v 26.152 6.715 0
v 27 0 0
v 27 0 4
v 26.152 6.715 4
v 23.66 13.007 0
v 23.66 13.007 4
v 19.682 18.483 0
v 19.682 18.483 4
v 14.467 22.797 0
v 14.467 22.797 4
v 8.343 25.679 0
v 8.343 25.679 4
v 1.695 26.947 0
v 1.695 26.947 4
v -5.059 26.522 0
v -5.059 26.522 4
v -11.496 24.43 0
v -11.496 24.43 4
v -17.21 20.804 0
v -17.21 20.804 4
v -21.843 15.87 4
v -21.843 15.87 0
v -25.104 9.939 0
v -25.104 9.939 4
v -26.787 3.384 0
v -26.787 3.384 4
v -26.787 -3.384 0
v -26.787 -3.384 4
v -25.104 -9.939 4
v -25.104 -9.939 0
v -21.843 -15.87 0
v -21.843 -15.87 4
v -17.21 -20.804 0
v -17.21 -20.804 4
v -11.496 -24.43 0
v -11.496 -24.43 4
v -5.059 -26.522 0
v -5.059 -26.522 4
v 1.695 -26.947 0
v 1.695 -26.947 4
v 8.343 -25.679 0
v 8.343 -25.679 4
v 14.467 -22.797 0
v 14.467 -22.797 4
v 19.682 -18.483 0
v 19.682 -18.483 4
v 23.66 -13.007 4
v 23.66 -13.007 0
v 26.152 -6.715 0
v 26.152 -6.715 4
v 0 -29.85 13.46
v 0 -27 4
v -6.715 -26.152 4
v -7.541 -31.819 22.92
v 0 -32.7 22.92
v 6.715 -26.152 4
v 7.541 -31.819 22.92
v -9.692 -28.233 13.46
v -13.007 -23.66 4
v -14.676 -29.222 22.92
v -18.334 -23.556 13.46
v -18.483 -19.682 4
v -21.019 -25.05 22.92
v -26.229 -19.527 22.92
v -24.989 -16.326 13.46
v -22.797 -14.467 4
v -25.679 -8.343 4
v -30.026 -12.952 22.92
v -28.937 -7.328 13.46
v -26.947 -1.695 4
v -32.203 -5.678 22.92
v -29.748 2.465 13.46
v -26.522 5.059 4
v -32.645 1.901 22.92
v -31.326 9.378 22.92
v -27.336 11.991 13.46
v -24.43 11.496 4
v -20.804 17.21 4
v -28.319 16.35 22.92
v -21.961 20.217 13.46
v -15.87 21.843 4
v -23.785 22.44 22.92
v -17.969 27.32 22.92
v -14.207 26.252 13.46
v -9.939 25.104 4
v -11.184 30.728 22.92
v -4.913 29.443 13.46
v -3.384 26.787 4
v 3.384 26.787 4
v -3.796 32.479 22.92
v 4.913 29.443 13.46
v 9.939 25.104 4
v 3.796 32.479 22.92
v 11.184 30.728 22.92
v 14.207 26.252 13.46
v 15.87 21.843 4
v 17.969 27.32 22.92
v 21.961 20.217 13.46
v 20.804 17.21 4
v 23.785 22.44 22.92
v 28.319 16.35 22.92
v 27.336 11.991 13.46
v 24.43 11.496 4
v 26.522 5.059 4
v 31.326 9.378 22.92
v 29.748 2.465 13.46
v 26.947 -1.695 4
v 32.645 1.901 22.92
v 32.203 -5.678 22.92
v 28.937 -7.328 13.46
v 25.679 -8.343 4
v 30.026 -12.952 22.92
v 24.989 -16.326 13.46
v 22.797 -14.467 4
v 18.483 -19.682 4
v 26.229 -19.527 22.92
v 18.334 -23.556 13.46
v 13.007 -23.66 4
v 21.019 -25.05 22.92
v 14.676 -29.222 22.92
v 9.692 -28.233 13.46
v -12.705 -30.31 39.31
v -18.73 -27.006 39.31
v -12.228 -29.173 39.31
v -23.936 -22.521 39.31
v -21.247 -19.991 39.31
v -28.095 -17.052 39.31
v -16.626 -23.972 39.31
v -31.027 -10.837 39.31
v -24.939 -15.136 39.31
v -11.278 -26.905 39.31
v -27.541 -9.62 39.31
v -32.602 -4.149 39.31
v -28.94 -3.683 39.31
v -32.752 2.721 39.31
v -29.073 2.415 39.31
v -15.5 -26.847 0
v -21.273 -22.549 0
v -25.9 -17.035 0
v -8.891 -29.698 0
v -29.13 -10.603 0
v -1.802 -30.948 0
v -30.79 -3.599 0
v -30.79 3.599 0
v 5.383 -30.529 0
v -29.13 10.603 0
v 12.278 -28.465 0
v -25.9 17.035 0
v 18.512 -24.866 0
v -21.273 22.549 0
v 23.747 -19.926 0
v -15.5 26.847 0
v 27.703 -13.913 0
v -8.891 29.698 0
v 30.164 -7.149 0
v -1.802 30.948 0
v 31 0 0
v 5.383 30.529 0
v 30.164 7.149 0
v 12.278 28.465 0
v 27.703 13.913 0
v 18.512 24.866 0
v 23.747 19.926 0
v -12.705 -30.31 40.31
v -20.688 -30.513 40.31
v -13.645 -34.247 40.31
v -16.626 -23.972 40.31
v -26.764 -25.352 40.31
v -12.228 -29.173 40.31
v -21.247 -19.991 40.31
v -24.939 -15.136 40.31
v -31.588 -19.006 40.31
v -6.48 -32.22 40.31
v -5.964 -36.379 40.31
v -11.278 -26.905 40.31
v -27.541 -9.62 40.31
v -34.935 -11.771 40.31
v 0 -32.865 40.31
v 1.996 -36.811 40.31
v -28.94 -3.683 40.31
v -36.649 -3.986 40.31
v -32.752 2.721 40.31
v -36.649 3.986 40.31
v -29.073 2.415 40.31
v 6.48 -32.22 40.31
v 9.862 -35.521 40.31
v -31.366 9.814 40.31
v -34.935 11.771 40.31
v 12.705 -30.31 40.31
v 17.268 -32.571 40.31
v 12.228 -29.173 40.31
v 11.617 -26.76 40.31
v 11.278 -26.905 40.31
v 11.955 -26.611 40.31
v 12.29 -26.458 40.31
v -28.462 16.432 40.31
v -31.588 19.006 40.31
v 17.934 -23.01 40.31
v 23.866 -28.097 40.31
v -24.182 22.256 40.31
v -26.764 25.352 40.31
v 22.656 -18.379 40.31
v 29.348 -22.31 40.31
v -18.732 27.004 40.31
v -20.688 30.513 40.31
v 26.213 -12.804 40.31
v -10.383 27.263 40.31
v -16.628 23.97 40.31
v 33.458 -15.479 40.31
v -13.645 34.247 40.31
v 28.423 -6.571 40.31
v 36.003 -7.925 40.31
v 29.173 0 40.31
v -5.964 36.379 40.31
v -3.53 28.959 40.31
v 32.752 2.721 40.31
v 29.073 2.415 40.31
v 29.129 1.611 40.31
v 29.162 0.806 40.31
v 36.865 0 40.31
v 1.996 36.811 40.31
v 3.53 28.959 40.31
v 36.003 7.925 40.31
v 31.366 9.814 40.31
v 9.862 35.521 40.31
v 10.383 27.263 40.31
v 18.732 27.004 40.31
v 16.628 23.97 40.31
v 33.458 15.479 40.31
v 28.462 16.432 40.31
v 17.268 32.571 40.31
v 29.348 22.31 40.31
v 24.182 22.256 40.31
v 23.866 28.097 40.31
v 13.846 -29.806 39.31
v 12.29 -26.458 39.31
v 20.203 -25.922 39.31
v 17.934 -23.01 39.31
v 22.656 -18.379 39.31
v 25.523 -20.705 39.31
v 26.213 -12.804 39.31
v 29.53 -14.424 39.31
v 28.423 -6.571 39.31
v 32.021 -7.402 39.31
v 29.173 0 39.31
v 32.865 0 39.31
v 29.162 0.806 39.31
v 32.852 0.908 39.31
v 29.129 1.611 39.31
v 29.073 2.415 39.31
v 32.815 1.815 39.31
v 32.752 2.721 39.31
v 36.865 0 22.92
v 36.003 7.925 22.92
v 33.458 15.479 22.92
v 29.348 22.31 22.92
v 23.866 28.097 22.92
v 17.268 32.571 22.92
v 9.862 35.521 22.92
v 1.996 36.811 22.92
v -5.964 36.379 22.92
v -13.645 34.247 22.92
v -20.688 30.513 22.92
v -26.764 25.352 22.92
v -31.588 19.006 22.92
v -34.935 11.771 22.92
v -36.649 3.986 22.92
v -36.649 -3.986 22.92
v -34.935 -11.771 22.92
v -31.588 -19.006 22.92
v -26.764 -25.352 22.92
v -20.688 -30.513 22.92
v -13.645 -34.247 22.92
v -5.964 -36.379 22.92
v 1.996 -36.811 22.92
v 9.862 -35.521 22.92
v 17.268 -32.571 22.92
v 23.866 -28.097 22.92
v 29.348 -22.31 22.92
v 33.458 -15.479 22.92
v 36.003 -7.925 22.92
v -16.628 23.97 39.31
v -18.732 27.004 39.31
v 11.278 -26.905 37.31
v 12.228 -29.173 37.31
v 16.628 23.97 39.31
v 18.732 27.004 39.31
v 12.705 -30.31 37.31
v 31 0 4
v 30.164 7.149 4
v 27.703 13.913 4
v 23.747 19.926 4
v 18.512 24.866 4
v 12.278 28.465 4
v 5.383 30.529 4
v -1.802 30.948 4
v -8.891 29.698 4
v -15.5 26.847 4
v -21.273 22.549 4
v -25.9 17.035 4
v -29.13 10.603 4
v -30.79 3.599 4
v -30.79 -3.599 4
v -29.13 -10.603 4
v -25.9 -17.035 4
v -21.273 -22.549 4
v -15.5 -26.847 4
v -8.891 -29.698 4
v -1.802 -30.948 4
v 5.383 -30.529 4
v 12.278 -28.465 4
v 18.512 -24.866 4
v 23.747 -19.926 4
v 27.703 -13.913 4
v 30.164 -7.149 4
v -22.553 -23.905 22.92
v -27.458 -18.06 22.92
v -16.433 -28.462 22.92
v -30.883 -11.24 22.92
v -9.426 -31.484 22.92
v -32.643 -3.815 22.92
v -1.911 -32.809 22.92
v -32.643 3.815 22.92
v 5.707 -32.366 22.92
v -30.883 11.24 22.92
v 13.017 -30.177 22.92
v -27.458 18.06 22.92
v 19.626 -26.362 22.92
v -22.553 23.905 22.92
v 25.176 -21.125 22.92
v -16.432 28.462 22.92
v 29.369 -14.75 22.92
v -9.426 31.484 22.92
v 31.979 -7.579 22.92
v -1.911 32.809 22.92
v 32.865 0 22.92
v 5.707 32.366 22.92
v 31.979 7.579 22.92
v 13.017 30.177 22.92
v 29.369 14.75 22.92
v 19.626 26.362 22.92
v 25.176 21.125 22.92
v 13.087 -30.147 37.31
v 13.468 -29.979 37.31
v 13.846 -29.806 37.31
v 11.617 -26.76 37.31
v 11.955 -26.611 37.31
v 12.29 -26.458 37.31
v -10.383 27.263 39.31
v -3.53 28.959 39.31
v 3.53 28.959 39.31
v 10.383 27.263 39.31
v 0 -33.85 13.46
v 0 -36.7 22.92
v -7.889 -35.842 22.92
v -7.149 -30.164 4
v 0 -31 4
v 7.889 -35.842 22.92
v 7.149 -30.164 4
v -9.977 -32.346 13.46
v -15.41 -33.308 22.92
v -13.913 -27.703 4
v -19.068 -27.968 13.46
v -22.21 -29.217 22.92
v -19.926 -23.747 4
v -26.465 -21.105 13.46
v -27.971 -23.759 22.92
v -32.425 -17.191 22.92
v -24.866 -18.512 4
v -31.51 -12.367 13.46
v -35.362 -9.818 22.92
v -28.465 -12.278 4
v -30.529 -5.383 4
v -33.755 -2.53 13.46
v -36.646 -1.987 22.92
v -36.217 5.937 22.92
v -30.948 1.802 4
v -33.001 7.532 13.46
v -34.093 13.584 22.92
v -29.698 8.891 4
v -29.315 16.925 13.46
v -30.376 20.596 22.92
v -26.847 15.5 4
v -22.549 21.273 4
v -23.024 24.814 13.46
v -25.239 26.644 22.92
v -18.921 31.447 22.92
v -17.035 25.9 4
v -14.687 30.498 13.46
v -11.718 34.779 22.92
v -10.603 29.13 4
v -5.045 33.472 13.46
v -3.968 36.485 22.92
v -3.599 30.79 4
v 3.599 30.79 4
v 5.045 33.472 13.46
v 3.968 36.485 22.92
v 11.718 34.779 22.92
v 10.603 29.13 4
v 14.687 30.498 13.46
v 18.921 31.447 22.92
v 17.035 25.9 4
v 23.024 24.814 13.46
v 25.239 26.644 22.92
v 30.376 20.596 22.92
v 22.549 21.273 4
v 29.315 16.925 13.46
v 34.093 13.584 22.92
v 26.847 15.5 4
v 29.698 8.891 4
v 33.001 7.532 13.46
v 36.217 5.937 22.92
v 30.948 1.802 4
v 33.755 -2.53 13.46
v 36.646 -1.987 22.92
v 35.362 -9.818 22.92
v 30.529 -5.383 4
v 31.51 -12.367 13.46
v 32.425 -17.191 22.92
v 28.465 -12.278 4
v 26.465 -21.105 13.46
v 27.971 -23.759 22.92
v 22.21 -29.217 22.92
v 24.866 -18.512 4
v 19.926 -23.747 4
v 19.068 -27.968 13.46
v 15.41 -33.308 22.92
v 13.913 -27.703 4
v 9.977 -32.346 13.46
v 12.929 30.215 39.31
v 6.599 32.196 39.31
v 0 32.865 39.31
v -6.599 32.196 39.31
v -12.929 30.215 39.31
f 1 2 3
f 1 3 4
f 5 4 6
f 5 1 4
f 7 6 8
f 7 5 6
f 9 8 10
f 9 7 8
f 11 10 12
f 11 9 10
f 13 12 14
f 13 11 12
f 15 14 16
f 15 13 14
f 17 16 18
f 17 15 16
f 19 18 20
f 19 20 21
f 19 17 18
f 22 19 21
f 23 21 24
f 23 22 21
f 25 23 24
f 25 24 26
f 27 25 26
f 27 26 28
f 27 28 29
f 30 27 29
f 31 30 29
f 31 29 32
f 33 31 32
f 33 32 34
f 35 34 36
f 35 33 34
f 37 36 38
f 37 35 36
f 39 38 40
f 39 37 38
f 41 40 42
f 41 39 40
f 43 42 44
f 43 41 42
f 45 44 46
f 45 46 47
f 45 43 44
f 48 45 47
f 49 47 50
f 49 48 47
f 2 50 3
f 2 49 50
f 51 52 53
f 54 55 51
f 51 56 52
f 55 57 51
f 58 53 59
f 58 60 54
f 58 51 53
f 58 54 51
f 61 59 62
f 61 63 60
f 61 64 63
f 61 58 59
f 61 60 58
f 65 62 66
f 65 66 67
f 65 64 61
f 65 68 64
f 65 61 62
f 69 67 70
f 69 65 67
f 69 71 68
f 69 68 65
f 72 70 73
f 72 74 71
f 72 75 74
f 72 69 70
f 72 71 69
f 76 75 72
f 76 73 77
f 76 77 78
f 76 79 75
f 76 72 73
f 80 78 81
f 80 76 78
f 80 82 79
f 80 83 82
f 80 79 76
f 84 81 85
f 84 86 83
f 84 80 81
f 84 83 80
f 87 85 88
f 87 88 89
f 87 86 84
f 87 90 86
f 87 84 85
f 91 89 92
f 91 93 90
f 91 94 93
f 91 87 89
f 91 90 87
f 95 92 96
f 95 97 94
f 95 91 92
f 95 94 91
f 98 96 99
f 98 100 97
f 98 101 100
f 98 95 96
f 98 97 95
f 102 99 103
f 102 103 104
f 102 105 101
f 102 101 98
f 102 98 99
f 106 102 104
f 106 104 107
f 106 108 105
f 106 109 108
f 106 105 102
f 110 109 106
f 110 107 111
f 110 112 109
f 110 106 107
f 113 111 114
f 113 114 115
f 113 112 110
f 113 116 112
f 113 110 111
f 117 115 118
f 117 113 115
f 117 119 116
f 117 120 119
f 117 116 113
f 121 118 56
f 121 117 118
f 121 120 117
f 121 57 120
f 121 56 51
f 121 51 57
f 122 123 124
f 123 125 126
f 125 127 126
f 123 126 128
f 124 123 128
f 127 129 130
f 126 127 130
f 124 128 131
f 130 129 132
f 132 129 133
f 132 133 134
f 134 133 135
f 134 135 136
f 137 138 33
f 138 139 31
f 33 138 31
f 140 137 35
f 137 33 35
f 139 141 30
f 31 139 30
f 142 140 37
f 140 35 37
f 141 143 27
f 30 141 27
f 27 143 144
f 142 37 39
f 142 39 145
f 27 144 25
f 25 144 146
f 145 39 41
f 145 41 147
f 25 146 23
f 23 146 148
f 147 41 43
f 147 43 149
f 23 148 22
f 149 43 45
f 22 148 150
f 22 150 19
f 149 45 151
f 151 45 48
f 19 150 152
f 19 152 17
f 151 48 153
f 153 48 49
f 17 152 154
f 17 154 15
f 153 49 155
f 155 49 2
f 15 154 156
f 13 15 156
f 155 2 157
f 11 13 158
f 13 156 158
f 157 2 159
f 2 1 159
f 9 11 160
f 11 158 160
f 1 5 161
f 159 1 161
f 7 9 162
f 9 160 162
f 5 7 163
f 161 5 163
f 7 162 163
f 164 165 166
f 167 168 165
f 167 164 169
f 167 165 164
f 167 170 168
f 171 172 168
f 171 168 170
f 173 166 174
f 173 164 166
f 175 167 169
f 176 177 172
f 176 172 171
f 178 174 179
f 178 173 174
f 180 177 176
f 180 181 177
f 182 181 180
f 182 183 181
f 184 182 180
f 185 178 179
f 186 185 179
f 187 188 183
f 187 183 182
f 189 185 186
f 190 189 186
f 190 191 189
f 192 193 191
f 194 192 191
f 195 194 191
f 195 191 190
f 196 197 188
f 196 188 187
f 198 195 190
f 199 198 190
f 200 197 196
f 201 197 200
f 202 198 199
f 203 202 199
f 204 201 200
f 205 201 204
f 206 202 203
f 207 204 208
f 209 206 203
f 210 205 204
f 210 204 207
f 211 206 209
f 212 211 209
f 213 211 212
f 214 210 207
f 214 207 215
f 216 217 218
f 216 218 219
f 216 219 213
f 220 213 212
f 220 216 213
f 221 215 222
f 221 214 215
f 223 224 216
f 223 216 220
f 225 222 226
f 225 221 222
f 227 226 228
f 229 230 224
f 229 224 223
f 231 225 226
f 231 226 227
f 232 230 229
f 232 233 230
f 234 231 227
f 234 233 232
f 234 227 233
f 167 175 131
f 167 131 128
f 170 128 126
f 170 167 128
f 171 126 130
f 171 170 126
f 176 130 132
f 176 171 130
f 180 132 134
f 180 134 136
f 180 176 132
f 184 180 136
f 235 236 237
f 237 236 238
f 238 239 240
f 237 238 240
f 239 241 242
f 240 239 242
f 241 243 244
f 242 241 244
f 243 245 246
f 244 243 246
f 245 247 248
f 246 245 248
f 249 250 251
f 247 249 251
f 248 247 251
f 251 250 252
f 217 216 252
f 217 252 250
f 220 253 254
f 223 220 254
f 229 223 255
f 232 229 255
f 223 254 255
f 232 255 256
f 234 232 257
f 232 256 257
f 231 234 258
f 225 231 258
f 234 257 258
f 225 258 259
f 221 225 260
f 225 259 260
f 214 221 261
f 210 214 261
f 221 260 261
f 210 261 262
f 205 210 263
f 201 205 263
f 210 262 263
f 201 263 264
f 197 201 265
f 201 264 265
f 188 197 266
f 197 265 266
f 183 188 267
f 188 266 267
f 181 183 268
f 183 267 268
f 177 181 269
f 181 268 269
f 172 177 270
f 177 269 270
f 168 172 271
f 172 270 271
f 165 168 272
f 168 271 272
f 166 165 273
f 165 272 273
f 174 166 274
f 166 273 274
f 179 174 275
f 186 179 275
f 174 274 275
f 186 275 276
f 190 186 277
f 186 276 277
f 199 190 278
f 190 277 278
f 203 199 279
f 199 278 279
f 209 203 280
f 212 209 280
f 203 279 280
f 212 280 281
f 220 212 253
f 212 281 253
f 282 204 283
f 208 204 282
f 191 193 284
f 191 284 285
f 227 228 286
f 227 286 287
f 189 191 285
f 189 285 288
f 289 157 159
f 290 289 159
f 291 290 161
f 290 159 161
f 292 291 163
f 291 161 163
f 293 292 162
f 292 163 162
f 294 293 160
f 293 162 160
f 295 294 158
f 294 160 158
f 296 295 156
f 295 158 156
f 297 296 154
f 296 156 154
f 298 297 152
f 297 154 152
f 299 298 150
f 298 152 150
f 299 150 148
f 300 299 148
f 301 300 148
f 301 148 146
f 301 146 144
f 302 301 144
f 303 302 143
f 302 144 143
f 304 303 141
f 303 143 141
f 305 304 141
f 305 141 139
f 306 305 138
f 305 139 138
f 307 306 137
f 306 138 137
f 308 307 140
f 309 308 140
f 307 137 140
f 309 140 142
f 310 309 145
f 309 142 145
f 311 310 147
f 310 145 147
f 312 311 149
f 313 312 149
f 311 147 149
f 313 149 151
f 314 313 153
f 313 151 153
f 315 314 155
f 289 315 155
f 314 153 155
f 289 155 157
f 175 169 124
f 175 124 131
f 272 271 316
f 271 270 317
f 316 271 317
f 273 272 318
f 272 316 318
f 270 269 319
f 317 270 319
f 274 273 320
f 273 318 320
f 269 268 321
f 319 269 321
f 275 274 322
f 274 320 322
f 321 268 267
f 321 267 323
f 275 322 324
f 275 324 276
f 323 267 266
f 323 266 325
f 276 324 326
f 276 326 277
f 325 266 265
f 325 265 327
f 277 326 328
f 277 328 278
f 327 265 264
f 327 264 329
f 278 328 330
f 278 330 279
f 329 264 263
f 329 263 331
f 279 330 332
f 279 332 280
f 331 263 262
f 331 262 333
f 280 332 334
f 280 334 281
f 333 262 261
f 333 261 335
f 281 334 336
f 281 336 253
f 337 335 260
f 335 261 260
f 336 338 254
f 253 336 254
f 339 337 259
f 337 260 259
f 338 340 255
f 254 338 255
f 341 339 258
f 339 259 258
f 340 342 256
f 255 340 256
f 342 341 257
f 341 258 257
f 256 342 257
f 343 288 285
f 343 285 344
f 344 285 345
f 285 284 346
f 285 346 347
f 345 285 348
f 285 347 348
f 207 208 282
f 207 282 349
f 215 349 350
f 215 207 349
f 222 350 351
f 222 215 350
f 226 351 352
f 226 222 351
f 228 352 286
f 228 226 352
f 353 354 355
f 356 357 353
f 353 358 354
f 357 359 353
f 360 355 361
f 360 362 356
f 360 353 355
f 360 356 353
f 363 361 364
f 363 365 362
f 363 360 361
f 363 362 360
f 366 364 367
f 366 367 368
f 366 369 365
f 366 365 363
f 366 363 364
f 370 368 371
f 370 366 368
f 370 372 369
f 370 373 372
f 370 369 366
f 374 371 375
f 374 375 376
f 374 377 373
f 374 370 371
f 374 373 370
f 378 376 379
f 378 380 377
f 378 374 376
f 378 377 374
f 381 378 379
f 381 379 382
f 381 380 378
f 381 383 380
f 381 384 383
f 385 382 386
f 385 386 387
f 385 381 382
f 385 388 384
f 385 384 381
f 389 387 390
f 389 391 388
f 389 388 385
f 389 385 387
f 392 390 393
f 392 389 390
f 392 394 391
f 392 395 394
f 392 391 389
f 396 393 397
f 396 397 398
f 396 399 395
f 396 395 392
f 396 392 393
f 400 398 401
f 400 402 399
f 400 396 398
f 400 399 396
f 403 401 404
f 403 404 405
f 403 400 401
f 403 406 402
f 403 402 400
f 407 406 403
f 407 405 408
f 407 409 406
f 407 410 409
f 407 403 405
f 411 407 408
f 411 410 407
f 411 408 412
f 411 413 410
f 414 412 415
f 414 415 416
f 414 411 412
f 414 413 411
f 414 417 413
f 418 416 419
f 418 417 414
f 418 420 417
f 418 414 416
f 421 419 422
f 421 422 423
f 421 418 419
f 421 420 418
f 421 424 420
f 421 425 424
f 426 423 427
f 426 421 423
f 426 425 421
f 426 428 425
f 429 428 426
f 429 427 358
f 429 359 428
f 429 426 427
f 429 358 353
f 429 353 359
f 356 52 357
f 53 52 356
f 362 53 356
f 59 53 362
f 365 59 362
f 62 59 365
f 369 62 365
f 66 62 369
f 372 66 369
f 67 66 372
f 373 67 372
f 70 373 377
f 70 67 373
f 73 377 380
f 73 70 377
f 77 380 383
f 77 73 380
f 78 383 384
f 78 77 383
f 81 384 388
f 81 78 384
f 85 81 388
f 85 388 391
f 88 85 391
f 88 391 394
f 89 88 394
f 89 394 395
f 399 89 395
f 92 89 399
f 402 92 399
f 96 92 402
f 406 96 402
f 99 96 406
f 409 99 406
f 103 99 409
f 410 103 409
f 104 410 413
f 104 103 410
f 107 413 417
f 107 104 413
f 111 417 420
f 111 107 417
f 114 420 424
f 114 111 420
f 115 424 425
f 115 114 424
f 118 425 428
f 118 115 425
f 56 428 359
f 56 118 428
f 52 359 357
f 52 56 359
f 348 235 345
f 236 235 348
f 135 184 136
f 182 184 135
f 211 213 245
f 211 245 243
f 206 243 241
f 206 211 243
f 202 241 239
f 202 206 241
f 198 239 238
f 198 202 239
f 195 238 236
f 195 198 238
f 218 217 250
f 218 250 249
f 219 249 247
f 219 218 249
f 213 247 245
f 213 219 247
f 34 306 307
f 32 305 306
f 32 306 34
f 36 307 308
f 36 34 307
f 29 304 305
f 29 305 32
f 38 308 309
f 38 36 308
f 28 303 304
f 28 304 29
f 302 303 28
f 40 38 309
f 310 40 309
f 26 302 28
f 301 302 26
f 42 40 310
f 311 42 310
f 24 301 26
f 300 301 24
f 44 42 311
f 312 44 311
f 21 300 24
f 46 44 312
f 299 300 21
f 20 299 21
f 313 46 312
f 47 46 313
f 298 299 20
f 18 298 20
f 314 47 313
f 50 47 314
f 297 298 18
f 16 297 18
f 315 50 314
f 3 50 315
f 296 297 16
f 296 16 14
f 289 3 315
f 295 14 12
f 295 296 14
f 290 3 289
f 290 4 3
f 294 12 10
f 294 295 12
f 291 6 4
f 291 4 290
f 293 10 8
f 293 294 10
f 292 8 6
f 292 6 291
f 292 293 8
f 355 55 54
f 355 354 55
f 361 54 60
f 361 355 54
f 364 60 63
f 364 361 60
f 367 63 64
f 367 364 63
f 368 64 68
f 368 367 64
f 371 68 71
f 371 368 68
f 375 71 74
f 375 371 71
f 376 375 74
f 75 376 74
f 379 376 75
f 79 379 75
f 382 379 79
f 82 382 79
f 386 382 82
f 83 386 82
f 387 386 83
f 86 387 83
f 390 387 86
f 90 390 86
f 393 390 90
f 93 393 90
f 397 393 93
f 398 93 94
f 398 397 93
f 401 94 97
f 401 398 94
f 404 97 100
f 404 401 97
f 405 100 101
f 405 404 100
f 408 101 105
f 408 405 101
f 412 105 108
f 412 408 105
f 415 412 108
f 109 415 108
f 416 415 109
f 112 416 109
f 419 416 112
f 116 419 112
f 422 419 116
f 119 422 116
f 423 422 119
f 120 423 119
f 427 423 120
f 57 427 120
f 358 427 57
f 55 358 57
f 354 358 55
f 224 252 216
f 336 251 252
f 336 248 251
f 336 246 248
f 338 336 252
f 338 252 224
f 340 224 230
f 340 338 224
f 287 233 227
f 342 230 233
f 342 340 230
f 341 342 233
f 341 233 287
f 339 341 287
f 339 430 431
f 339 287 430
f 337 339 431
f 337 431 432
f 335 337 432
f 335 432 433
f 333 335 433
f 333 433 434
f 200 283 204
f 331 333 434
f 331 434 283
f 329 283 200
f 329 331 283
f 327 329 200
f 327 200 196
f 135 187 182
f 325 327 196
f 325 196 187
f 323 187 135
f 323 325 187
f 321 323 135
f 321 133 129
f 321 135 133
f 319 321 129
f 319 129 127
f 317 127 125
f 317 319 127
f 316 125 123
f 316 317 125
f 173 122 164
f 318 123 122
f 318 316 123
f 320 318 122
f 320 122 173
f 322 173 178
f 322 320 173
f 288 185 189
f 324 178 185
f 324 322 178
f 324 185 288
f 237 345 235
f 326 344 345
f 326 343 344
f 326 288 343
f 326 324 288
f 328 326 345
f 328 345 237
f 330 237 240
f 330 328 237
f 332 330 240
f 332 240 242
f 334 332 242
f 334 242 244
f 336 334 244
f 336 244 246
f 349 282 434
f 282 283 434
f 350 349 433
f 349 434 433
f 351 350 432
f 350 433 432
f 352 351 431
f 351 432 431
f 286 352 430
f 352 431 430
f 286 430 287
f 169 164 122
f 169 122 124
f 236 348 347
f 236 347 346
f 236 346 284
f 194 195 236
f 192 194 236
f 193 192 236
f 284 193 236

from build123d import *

# Parameters (mm, degrees)
F10_R    = 31
F10_R_2  = 27
F1_DEPTH = 4
F3_R     = 36.865
F3_R_2   = 32.865
F4_DEPTH = 17.39
F8_DEPTH = 1
F9_DEPTH = 3


with BuildPart() as f1:
    # F10 (on Top) → F1 (new body)
    with BuildSketch(Plane.XY):
        Circle(F10_R)
        Circle(F10_R_2, mode=Mode.SUBTRACT)
    extrude(amount=F1_DEPTH)


with BuildPart() as f4:
    # F3 (on offset) → F4 (new body)
    with BuildSketch(Plane.XY.offset(22.92)):
        Circle(F3_R)
        Circle(F3_R_2, mode=Mode.SUBTRACT)
    extrude(amount=F4_DEPTH)

    # F6 (on offset) → F8 (join)
    with BuildSketch(Plane.XY.offset(40.31)):
        with BuildLine():
            ThreePointArc((-32.8518569318, 2.7288681042), (-28.1807336862, -17.103726901), (-12.743658147, -30.4021446946))
            Line((-12.743658147, -30.4021446946), (-12.2284547539, -29.1730401531))
            Line((-12.2284547539, -29.1730401531), (-11.2777567365, -26.9049897745))
            ThreePointArc((-11.2777567365, -26.9049897745), (-24.9391073979, -15.1362873245), (-29.072911918, 2.4149667459))
            Line((-29.072911918, 2.4149667459), (-32.8518569318, 2.7288681042))
        make_face()
        with BuildLine():
            Line((16.6278785102, 23.97039691), (18.7891975678, 27.0861086123))
            ThreePointArc((18.7891975678, 27.0861086123), (0, 32.965), (-18.7891975678, 27.0861086123))
            Line((-18.7891975678, 27.0861086123), (-16.6278785102, 23.97039691))
            ThreePointArc((-16.6278785102, 23.97039691), (0, 29.1730401531), (16.6278785102, 23.97039691))
        make_face()
        with BuildLine():
            ThreePointArc((13.8877431902, -29.8968529127), (27.789392574, -17.7324810832), (32.965, 0))
            ThreePointArc((32.965, 0), (32.9367020872, 1.3656063199), (32.8518569318, 2.7288681042))
            Line((32.8518569318, 2.7288681042), (29.072911918, 2.4149667459))
            ThreePointArc((29.072911918, 2.4149667459), (29.1479973456, 1.2085207949), (29.1730401531, 0))
            ThreePointArc((29.1730401531, 0), (24.5927822051, -15.6927159914), (12.2902378196, -26.4578216433))
            Line((12.2902378196, -26.4578216433), (13.8877431902, -29.8968529127))
        make_face()
    extrude(amount=-F8_DEPTH)

    # F6 (on offset) → F9 (join)
    with BuildSketch(Plane.XY.offset(40.31)):
        with BuildLine():
            ThreePointArc((12.743658147, -30.4021446946), (13.3180972455, -30.1549251493), (13.8877431902, -29.8968529127))
            Line((13.8877431902, -29.8968529127), (12.2902378196, -26.4578216433))
            ThreePointArc((12.2902378196, -26.4578216433), (11.786118177, -26.6862078627), (11.2777567365, -26.9049897745))
            Line((11.2777567365, -26.9049897745), (12.2284547539, -29.1730401531))
            Line((12.2284547539, -29.1730401531), (12.743658147, -30.4021446946))
        make_face()
    extrude(amount=-F9_DEPTH)


with BuildPart() as f7:
    # F7: sweep along a path in F7_path
    with BuildLine(Plane(origin=(27, 0, 4), x_dir=(0, -1, 0), z_dir=(0, 0, -1))) as f7_path:
        CenterArc((0, 27), 27, 0, 360)
    # F0 (on Front) → F7 (sweep)
    with BuildSketch(Plane.XZ):
        Polygon((-27, 4), (-32.7, 22.92), (-36.7, 22.92), (-31, 4), align=None)
    sweep(path=f7_path.line)


solid = Compound([f1.part, f4.part, f7.part])
